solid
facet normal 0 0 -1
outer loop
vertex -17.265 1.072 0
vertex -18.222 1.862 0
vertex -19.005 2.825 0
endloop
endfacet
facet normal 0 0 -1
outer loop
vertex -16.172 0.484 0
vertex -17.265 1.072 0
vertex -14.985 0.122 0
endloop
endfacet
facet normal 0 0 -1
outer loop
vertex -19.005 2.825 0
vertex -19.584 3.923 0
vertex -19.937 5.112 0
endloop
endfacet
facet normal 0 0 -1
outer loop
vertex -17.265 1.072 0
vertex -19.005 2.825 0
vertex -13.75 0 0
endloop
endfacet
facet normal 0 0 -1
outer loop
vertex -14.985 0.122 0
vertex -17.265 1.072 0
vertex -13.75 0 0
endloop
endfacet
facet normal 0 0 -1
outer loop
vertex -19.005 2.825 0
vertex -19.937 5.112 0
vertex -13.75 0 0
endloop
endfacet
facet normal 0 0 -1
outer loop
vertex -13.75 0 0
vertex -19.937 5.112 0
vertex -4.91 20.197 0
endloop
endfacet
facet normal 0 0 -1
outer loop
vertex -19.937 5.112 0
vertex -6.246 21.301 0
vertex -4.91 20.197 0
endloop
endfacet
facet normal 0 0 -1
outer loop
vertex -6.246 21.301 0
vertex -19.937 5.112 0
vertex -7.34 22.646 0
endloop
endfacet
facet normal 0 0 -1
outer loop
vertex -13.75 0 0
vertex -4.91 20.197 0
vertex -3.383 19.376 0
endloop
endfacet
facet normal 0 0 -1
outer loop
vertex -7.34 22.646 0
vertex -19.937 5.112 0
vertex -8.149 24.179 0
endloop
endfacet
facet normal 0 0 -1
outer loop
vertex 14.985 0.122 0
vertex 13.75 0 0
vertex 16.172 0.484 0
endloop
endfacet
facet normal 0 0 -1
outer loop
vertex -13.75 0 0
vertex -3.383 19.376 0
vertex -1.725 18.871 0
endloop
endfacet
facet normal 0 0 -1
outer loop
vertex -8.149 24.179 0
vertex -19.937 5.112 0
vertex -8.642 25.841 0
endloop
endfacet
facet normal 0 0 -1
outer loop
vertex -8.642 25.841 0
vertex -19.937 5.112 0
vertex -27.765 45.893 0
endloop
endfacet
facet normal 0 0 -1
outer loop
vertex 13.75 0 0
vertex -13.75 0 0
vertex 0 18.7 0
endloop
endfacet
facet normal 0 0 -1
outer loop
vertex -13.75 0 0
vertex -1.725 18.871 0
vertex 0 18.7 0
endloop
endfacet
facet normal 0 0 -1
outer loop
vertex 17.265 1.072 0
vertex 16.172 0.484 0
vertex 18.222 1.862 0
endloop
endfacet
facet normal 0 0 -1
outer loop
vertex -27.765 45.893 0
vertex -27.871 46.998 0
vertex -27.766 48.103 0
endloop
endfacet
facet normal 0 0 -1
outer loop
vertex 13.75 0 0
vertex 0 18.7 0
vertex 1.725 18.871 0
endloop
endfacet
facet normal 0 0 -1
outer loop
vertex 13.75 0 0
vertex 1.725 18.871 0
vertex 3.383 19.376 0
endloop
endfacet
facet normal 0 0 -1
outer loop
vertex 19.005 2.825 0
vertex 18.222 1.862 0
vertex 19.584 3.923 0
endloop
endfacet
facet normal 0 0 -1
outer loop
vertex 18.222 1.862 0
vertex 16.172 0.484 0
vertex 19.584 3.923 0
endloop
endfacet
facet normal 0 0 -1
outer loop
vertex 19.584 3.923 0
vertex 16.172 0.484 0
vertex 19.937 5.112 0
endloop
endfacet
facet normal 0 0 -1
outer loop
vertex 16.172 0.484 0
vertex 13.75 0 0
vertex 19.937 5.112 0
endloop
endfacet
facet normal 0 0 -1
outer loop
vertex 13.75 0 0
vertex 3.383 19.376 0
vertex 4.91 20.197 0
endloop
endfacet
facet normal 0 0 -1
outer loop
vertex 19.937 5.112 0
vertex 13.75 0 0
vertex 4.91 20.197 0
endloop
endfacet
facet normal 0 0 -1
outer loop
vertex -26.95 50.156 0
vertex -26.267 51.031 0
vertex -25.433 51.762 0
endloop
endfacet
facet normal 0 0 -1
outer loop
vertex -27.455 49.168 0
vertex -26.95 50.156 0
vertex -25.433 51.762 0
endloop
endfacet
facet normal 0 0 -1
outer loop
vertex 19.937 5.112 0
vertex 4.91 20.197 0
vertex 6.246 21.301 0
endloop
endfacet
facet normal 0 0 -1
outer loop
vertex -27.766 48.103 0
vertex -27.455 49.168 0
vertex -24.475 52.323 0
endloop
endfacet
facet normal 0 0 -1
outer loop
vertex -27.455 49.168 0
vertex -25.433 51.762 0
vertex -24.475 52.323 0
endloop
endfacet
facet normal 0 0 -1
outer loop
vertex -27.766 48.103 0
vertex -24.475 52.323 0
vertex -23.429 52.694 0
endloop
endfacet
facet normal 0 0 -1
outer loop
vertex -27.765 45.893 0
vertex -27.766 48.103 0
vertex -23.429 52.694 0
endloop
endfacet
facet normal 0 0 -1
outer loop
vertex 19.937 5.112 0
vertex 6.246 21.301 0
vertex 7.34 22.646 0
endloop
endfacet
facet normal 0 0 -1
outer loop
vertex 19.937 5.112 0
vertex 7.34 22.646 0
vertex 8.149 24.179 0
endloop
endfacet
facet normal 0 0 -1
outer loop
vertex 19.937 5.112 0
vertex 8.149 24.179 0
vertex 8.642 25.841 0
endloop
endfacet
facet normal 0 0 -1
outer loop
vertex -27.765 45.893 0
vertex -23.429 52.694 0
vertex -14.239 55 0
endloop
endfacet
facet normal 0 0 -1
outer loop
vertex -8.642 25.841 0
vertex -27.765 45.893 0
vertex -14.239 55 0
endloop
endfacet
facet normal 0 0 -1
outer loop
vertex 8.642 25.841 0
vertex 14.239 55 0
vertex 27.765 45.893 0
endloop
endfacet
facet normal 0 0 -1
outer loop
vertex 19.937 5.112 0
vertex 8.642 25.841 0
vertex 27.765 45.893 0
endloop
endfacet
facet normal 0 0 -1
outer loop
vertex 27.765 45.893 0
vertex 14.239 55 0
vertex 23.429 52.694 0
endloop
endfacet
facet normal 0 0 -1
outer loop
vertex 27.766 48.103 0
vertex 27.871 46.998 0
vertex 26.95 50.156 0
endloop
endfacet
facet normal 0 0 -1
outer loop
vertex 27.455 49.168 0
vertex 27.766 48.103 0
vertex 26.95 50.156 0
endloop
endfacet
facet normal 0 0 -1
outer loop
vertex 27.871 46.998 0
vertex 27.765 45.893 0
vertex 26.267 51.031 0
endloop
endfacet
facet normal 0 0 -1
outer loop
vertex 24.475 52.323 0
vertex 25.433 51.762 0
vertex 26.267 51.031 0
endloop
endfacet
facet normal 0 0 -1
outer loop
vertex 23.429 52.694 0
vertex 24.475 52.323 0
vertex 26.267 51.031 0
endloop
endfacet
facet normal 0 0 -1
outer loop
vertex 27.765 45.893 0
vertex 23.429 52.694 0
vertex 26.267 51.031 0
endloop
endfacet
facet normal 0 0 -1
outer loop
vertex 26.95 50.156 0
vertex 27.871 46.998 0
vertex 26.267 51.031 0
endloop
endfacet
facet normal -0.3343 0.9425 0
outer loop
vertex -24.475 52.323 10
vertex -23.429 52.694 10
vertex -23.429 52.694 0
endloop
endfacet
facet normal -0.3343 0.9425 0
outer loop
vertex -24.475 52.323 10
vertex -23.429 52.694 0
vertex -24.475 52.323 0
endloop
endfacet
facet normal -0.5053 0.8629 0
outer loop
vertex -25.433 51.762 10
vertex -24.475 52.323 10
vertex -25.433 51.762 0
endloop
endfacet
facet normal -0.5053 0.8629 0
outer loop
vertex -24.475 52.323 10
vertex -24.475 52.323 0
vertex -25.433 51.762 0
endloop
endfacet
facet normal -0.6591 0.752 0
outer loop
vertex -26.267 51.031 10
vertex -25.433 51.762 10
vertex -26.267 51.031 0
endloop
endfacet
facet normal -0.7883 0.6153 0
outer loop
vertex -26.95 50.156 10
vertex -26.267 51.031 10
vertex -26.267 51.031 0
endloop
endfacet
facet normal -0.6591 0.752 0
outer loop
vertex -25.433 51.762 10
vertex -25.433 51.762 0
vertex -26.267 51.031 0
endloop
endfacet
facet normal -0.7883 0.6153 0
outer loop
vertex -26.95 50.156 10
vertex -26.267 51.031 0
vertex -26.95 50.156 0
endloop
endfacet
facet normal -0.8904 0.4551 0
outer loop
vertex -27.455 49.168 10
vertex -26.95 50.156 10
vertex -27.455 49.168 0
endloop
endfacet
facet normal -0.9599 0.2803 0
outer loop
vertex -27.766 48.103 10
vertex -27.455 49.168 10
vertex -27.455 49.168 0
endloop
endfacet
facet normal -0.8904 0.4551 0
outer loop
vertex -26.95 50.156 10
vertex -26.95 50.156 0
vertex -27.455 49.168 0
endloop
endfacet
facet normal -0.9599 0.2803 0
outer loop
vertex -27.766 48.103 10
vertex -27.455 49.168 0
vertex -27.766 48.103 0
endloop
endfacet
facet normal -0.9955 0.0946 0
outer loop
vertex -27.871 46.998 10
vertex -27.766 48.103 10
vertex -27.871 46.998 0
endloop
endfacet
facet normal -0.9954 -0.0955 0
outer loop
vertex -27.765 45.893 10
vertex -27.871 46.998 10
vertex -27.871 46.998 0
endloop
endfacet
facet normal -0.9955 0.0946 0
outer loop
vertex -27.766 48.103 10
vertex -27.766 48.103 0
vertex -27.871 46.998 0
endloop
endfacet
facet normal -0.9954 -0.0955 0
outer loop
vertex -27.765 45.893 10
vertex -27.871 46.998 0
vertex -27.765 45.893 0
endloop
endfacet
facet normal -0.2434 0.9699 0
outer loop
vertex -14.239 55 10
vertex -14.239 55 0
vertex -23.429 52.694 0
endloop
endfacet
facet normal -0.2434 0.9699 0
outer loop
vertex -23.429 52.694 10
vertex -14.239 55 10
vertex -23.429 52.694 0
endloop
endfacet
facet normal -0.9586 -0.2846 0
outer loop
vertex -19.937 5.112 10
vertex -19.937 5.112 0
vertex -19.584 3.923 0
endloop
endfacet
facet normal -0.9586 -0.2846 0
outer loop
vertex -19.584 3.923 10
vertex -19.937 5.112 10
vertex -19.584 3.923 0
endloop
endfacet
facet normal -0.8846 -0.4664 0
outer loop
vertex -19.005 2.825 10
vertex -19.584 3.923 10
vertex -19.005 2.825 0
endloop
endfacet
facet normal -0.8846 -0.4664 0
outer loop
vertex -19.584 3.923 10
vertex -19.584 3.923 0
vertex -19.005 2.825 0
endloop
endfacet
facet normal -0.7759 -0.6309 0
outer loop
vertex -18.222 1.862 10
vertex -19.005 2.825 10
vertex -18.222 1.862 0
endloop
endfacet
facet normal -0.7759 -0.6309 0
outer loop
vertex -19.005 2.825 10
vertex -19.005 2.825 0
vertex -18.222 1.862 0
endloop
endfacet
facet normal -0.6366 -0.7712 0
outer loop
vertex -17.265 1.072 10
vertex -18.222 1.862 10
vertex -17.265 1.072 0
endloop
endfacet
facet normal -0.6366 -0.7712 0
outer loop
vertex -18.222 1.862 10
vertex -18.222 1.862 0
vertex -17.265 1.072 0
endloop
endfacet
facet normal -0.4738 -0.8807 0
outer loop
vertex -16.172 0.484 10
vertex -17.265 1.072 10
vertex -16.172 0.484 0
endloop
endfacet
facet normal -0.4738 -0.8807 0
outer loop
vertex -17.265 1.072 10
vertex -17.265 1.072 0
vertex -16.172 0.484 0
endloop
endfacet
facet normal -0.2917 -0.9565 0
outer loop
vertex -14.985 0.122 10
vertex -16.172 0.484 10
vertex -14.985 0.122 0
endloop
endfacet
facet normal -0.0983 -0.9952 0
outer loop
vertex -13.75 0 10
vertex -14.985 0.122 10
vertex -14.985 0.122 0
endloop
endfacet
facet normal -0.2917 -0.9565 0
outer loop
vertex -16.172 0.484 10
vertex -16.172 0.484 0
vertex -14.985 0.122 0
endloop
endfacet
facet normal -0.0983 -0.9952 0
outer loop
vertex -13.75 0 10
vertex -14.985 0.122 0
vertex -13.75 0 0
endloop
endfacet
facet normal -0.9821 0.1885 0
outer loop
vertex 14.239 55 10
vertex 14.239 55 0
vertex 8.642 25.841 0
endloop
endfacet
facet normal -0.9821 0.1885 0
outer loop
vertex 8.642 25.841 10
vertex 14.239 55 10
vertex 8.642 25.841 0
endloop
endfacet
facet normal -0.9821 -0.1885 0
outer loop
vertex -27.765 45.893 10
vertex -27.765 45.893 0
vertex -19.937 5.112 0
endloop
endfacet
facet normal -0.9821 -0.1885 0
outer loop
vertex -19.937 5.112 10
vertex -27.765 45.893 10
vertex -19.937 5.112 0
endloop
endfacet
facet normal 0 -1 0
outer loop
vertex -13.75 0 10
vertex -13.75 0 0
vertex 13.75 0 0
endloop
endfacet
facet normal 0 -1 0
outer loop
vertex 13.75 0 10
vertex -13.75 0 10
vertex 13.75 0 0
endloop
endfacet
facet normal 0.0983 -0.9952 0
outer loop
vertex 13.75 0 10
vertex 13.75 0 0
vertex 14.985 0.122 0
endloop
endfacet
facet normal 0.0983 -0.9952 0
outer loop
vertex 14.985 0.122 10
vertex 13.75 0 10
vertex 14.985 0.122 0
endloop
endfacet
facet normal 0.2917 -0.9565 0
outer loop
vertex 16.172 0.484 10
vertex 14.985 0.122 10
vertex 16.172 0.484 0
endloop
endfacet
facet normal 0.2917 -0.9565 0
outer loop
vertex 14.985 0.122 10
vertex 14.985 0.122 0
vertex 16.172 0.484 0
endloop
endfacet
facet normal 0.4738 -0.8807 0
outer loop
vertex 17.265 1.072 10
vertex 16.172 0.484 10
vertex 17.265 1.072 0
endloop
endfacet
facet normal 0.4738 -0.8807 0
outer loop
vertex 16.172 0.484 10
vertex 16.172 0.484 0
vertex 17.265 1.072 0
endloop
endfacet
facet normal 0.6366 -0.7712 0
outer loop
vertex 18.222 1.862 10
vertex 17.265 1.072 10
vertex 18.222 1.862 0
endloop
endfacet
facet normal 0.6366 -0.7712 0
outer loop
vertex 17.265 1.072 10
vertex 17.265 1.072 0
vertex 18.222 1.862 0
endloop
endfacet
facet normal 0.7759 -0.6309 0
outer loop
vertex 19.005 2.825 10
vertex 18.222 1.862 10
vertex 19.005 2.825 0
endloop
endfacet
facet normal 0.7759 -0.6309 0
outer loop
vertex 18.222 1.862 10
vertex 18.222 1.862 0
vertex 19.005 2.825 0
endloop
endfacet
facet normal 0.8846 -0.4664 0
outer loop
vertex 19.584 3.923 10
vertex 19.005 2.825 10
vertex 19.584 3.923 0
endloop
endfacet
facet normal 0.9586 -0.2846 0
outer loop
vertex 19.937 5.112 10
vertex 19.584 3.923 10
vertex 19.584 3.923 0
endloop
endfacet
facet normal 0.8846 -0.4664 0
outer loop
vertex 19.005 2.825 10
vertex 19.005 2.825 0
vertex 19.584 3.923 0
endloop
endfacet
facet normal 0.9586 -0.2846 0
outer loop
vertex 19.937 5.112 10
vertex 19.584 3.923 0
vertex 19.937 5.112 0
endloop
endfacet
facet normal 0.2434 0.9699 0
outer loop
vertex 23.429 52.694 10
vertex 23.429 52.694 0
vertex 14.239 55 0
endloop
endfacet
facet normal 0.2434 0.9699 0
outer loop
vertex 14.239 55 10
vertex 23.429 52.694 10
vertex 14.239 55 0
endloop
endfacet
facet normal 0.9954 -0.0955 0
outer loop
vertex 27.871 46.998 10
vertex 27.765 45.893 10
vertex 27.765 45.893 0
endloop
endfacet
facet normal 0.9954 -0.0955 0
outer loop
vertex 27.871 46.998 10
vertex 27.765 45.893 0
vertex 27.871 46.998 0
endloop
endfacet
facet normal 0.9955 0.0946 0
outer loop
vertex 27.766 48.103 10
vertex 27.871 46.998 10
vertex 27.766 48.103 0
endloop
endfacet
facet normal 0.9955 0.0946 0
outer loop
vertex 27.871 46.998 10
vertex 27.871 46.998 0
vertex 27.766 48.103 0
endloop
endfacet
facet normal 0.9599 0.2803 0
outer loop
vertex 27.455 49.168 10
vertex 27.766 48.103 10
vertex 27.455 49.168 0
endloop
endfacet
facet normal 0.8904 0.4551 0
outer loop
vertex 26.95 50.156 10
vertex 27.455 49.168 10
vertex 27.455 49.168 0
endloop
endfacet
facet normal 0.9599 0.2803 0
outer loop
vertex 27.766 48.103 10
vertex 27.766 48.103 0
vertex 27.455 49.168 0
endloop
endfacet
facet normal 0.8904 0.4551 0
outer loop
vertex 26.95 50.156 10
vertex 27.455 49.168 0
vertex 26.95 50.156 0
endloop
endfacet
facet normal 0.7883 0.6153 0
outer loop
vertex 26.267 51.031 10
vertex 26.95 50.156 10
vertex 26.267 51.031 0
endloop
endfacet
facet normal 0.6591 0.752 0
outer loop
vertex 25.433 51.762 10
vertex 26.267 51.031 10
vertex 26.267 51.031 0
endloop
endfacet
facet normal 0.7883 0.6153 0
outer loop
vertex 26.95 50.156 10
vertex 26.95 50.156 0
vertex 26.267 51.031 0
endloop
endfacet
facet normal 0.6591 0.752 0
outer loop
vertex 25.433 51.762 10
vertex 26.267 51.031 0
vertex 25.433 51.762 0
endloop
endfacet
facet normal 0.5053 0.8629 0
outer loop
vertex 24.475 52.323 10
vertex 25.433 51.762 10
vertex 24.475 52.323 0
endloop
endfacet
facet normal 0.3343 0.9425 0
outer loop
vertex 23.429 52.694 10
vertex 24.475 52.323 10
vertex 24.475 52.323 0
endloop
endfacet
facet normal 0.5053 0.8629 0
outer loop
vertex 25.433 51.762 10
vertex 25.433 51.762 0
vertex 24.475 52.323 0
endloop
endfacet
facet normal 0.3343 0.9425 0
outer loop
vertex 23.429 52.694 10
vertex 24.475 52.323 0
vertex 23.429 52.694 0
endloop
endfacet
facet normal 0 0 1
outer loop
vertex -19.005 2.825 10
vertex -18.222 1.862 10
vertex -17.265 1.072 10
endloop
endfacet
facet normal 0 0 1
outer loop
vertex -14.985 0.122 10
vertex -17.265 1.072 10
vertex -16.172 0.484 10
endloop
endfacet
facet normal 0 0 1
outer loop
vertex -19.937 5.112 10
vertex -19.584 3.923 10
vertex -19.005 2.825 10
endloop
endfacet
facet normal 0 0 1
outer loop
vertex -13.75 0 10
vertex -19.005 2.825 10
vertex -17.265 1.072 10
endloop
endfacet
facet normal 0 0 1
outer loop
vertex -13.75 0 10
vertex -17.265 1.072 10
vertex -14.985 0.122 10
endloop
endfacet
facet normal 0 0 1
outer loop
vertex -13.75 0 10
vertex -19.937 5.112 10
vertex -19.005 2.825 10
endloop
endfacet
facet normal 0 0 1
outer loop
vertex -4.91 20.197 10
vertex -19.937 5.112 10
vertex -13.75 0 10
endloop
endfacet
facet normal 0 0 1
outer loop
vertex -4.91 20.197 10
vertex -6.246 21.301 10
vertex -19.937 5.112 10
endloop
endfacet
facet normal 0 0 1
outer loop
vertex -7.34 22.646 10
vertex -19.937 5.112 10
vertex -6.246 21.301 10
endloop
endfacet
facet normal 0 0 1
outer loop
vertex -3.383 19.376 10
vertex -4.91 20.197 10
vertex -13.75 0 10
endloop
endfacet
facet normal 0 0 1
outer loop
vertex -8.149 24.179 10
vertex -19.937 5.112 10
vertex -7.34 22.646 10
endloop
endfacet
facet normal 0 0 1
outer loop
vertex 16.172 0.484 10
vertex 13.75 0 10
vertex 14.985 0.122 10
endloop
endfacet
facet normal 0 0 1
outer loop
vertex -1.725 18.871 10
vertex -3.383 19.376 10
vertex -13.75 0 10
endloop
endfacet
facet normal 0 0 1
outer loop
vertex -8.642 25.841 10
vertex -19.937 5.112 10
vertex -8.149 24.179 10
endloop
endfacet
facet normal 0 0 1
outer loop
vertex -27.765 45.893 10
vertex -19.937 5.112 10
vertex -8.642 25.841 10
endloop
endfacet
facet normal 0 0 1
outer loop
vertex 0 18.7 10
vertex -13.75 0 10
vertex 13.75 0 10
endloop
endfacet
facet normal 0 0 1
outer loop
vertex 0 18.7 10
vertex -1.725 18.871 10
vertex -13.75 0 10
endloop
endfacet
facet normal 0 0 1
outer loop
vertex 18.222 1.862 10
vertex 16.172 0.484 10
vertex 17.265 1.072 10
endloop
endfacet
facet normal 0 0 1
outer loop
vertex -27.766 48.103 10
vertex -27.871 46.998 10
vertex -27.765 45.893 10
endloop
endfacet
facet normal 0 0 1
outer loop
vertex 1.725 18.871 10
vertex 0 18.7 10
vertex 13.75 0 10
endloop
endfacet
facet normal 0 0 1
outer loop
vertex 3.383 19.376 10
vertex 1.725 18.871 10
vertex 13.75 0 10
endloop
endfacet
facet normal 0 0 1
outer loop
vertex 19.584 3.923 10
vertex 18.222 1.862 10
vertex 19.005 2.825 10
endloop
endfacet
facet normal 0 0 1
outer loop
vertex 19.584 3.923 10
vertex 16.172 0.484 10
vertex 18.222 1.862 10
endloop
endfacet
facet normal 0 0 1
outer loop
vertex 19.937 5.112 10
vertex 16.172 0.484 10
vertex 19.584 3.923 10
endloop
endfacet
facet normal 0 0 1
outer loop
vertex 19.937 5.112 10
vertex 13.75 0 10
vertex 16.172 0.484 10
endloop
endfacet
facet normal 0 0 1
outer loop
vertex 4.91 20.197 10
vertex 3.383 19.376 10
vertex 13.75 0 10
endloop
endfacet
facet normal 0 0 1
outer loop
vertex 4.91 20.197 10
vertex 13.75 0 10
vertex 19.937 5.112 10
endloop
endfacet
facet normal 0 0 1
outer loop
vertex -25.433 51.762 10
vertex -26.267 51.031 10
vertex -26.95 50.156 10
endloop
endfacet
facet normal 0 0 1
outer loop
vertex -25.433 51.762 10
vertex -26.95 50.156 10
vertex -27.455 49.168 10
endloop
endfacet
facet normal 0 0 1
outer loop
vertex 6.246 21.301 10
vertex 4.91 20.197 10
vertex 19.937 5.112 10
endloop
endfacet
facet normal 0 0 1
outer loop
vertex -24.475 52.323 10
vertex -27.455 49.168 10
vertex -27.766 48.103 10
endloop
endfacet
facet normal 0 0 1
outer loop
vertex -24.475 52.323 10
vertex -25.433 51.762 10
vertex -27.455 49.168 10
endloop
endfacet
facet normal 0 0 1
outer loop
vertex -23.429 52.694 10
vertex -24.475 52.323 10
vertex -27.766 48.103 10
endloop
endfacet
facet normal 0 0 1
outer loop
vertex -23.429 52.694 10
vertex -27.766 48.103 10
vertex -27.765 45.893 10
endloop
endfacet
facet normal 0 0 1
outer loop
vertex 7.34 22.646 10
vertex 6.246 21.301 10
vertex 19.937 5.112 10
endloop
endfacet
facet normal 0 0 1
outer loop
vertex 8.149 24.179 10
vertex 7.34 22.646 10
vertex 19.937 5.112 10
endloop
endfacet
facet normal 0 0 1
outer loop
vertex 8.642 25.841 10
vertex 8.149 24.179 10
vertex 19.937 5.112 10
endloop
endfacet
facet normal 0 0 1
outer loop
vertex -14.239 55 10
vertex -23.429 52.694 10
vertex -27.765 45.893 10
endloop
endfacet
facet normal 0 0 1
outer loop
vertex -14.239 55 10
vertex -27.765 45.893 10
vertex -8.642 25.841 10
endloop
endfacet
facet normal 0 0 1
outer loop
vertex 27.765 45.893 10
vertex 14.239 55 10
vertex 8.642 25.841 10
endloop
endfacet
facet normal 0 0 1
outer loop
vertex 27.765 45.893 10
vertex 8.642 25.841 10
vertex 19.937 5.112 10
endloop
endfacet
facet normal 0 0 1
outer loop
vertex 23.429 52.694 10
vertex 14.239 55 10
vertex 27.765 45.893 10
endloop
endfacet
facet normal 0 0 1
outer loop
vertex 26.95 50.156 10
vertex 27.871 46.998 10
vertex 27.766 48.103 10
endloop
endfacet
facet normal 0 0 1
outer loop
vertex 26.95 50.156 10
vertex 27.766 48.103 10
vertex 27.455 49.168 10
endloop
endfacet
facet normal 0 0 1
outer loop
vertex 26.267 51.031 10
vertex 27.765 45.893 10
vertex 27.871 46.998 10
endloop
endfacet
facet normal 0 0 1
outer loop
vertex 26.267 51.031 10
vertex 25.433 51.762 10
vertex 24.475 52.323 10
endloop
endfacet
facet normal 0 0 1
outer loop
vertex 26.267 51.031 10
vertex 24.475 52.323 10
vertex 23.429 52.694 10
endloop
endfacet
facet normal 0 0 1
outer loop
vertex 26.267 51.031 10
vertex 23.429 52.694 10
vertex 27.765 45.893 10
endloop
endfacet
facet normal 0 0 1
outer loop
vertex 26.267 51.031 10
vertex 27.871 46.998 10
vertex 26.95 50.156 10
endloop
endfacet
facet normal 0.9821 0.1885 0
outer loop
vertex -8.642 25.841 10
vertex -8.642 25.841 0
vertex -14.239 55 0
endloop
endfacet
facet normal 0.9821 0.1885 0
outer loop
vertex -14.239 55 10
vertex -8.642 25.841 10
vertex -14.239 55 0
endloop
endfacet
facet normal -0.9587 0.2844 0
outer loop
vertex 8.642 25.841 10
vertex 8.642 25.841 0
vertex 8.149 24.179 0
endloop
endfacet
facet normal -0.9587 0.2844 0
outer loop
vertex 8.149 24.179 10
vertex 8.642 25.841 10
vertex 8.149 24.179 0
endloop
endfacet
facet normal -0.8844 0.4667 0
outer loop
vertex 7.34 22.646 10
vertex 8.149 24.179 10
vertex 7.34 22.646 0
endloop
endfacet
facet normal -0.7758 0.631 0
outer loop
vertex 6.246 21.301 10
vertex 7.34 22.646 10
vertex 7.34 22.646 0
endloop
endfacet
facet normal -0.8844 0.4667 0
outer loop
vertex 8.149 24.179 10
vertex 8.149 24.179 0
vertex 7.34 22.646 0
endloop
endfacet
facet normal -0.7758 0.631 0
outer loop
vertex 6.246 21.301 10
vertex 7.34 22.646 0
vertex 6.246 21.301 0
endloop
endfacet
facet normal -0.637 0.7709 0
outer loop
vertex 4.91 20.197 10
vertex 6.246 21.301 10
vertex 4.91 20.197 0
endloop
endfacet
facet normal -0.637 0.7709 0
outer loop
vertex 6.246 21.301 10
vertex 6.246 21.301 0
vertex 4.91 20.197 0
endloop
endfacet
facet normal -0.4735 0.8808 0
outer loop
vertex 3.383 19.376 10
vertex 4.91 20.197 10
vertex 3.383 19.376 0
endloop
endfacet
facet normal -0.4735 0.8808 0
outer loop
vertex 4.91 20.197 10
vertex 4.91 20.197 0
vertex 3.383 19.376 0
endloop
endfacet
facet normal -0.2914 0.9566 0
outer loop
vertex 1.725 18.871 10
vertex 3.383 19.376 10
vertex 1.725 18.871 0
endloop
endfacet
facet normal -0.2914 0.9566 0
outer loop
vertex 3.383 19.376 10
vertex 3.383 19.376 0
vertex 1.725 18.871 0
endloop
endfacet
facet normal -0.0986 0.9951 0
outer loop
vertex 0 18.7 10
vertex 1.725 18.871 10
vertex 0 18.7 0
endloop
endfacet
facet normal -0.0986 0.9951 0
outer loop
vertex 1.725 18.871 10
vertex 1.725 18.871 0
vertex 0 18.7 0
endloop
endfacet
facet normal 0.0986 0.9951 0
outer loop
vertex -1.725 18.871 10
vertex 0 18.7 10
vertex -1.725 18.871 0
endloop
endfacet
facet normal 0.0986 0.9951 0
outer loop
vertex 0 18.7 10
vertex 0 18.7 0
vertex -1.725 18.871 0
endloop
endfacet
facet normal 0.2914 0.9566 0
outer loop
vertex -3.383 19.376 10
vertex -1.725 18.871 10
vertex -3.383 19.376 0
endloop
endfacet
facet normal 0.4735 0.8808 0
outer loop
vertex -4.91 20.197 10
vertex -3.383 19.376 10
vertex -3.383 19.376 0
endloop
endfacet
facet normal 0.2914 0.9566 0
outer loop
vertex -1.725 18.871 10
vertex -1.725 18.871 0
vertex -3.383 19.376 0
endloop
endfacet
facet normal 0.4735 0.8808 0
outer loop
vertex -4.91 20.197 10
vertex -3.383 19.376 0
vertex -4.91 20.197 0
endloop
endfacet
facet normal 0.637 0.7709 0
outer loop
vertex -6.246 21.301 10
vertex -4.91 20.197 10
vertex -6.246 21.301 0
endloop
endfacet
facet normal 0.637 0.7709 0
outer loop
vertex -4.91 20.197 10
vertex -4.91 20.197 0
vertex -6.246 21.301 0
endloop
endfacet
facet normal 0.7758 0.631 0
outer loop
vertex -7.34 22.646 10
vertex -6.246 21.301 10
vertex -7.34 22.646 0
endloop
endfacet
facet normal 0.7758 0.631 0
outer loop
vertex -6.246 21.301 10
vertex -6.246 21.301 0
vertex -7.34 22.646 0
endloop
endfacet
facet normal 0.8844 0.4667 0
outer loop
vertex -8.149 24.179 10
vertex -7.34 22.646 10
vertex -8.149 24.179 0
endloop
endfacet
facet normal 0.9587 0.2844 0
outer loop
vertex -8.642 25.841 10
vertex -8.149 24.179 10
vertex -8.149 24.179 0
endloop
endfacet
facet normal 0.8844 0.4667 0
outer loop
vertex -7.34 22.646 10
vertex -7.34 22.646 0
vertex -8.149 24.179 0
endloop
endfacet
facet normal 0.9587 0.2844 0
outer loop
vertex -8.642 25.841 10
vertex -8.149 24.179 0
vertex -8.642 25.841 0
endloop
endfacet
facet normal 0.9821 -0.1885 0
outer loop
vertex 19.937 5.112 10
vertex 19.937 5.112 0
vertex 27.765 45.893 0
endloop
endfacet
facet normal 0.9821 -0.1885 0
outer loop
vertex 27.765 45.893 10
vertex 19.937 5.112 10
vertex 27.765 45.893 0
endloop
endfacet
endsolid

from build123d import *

# Parameters (mm, degrees)
SALIENTE_EXTRUIR1_DEPTH = 10


with BuildPart() as part:
    # Croquis1 → Saliente-Extruir1 (new body)
    with BuildSketch(Plane.XY):
        with BuildLine():
            Line((-13.75, 0), (13.75, 0))
            ThreePointArc((13.75, 0), (17.762966925, 1.443448089), (19.937041964, 5.11235033))
            Line((19.937041964, 5.11235033), (27.765257697, 45.893315022))
            ThreePointArc((27.765257697, 45.893315022), (26.949859086, 50.156238741), (23.428875228, 52.693967294))
            Line((23.428875228, 52.693967294), (14.23949707, 55))
            Line((14.23949707, 55), (8.642217346, 25.841060779))
            ThreePointArc((8.642217346, 25.841060779), (0, 18.7), (-8.642217346, 25.841060779))
            Line((-8.642217346, 25.841060779), (-14.23949707, 55))
            Line((-14.23949707, 55), (-23.428875228, 52.693967294))
            ThreePointArc((-23.428875228, 52.693967294), (-26.949859086, 50.156238741), (-27.765257697, 45.893315022))
            Line((-27.765257697, 45.893315022), (-19.937041964, 5.11235033))
            ThreePointArc((-19.937041964, 5.11235033), (-17.762966925, 1.443448089), (-13.75, 0))
        make_face()
    extrude(amount=SALIENTE_EXTRUIR1_DEPTH)


solid = part.part
